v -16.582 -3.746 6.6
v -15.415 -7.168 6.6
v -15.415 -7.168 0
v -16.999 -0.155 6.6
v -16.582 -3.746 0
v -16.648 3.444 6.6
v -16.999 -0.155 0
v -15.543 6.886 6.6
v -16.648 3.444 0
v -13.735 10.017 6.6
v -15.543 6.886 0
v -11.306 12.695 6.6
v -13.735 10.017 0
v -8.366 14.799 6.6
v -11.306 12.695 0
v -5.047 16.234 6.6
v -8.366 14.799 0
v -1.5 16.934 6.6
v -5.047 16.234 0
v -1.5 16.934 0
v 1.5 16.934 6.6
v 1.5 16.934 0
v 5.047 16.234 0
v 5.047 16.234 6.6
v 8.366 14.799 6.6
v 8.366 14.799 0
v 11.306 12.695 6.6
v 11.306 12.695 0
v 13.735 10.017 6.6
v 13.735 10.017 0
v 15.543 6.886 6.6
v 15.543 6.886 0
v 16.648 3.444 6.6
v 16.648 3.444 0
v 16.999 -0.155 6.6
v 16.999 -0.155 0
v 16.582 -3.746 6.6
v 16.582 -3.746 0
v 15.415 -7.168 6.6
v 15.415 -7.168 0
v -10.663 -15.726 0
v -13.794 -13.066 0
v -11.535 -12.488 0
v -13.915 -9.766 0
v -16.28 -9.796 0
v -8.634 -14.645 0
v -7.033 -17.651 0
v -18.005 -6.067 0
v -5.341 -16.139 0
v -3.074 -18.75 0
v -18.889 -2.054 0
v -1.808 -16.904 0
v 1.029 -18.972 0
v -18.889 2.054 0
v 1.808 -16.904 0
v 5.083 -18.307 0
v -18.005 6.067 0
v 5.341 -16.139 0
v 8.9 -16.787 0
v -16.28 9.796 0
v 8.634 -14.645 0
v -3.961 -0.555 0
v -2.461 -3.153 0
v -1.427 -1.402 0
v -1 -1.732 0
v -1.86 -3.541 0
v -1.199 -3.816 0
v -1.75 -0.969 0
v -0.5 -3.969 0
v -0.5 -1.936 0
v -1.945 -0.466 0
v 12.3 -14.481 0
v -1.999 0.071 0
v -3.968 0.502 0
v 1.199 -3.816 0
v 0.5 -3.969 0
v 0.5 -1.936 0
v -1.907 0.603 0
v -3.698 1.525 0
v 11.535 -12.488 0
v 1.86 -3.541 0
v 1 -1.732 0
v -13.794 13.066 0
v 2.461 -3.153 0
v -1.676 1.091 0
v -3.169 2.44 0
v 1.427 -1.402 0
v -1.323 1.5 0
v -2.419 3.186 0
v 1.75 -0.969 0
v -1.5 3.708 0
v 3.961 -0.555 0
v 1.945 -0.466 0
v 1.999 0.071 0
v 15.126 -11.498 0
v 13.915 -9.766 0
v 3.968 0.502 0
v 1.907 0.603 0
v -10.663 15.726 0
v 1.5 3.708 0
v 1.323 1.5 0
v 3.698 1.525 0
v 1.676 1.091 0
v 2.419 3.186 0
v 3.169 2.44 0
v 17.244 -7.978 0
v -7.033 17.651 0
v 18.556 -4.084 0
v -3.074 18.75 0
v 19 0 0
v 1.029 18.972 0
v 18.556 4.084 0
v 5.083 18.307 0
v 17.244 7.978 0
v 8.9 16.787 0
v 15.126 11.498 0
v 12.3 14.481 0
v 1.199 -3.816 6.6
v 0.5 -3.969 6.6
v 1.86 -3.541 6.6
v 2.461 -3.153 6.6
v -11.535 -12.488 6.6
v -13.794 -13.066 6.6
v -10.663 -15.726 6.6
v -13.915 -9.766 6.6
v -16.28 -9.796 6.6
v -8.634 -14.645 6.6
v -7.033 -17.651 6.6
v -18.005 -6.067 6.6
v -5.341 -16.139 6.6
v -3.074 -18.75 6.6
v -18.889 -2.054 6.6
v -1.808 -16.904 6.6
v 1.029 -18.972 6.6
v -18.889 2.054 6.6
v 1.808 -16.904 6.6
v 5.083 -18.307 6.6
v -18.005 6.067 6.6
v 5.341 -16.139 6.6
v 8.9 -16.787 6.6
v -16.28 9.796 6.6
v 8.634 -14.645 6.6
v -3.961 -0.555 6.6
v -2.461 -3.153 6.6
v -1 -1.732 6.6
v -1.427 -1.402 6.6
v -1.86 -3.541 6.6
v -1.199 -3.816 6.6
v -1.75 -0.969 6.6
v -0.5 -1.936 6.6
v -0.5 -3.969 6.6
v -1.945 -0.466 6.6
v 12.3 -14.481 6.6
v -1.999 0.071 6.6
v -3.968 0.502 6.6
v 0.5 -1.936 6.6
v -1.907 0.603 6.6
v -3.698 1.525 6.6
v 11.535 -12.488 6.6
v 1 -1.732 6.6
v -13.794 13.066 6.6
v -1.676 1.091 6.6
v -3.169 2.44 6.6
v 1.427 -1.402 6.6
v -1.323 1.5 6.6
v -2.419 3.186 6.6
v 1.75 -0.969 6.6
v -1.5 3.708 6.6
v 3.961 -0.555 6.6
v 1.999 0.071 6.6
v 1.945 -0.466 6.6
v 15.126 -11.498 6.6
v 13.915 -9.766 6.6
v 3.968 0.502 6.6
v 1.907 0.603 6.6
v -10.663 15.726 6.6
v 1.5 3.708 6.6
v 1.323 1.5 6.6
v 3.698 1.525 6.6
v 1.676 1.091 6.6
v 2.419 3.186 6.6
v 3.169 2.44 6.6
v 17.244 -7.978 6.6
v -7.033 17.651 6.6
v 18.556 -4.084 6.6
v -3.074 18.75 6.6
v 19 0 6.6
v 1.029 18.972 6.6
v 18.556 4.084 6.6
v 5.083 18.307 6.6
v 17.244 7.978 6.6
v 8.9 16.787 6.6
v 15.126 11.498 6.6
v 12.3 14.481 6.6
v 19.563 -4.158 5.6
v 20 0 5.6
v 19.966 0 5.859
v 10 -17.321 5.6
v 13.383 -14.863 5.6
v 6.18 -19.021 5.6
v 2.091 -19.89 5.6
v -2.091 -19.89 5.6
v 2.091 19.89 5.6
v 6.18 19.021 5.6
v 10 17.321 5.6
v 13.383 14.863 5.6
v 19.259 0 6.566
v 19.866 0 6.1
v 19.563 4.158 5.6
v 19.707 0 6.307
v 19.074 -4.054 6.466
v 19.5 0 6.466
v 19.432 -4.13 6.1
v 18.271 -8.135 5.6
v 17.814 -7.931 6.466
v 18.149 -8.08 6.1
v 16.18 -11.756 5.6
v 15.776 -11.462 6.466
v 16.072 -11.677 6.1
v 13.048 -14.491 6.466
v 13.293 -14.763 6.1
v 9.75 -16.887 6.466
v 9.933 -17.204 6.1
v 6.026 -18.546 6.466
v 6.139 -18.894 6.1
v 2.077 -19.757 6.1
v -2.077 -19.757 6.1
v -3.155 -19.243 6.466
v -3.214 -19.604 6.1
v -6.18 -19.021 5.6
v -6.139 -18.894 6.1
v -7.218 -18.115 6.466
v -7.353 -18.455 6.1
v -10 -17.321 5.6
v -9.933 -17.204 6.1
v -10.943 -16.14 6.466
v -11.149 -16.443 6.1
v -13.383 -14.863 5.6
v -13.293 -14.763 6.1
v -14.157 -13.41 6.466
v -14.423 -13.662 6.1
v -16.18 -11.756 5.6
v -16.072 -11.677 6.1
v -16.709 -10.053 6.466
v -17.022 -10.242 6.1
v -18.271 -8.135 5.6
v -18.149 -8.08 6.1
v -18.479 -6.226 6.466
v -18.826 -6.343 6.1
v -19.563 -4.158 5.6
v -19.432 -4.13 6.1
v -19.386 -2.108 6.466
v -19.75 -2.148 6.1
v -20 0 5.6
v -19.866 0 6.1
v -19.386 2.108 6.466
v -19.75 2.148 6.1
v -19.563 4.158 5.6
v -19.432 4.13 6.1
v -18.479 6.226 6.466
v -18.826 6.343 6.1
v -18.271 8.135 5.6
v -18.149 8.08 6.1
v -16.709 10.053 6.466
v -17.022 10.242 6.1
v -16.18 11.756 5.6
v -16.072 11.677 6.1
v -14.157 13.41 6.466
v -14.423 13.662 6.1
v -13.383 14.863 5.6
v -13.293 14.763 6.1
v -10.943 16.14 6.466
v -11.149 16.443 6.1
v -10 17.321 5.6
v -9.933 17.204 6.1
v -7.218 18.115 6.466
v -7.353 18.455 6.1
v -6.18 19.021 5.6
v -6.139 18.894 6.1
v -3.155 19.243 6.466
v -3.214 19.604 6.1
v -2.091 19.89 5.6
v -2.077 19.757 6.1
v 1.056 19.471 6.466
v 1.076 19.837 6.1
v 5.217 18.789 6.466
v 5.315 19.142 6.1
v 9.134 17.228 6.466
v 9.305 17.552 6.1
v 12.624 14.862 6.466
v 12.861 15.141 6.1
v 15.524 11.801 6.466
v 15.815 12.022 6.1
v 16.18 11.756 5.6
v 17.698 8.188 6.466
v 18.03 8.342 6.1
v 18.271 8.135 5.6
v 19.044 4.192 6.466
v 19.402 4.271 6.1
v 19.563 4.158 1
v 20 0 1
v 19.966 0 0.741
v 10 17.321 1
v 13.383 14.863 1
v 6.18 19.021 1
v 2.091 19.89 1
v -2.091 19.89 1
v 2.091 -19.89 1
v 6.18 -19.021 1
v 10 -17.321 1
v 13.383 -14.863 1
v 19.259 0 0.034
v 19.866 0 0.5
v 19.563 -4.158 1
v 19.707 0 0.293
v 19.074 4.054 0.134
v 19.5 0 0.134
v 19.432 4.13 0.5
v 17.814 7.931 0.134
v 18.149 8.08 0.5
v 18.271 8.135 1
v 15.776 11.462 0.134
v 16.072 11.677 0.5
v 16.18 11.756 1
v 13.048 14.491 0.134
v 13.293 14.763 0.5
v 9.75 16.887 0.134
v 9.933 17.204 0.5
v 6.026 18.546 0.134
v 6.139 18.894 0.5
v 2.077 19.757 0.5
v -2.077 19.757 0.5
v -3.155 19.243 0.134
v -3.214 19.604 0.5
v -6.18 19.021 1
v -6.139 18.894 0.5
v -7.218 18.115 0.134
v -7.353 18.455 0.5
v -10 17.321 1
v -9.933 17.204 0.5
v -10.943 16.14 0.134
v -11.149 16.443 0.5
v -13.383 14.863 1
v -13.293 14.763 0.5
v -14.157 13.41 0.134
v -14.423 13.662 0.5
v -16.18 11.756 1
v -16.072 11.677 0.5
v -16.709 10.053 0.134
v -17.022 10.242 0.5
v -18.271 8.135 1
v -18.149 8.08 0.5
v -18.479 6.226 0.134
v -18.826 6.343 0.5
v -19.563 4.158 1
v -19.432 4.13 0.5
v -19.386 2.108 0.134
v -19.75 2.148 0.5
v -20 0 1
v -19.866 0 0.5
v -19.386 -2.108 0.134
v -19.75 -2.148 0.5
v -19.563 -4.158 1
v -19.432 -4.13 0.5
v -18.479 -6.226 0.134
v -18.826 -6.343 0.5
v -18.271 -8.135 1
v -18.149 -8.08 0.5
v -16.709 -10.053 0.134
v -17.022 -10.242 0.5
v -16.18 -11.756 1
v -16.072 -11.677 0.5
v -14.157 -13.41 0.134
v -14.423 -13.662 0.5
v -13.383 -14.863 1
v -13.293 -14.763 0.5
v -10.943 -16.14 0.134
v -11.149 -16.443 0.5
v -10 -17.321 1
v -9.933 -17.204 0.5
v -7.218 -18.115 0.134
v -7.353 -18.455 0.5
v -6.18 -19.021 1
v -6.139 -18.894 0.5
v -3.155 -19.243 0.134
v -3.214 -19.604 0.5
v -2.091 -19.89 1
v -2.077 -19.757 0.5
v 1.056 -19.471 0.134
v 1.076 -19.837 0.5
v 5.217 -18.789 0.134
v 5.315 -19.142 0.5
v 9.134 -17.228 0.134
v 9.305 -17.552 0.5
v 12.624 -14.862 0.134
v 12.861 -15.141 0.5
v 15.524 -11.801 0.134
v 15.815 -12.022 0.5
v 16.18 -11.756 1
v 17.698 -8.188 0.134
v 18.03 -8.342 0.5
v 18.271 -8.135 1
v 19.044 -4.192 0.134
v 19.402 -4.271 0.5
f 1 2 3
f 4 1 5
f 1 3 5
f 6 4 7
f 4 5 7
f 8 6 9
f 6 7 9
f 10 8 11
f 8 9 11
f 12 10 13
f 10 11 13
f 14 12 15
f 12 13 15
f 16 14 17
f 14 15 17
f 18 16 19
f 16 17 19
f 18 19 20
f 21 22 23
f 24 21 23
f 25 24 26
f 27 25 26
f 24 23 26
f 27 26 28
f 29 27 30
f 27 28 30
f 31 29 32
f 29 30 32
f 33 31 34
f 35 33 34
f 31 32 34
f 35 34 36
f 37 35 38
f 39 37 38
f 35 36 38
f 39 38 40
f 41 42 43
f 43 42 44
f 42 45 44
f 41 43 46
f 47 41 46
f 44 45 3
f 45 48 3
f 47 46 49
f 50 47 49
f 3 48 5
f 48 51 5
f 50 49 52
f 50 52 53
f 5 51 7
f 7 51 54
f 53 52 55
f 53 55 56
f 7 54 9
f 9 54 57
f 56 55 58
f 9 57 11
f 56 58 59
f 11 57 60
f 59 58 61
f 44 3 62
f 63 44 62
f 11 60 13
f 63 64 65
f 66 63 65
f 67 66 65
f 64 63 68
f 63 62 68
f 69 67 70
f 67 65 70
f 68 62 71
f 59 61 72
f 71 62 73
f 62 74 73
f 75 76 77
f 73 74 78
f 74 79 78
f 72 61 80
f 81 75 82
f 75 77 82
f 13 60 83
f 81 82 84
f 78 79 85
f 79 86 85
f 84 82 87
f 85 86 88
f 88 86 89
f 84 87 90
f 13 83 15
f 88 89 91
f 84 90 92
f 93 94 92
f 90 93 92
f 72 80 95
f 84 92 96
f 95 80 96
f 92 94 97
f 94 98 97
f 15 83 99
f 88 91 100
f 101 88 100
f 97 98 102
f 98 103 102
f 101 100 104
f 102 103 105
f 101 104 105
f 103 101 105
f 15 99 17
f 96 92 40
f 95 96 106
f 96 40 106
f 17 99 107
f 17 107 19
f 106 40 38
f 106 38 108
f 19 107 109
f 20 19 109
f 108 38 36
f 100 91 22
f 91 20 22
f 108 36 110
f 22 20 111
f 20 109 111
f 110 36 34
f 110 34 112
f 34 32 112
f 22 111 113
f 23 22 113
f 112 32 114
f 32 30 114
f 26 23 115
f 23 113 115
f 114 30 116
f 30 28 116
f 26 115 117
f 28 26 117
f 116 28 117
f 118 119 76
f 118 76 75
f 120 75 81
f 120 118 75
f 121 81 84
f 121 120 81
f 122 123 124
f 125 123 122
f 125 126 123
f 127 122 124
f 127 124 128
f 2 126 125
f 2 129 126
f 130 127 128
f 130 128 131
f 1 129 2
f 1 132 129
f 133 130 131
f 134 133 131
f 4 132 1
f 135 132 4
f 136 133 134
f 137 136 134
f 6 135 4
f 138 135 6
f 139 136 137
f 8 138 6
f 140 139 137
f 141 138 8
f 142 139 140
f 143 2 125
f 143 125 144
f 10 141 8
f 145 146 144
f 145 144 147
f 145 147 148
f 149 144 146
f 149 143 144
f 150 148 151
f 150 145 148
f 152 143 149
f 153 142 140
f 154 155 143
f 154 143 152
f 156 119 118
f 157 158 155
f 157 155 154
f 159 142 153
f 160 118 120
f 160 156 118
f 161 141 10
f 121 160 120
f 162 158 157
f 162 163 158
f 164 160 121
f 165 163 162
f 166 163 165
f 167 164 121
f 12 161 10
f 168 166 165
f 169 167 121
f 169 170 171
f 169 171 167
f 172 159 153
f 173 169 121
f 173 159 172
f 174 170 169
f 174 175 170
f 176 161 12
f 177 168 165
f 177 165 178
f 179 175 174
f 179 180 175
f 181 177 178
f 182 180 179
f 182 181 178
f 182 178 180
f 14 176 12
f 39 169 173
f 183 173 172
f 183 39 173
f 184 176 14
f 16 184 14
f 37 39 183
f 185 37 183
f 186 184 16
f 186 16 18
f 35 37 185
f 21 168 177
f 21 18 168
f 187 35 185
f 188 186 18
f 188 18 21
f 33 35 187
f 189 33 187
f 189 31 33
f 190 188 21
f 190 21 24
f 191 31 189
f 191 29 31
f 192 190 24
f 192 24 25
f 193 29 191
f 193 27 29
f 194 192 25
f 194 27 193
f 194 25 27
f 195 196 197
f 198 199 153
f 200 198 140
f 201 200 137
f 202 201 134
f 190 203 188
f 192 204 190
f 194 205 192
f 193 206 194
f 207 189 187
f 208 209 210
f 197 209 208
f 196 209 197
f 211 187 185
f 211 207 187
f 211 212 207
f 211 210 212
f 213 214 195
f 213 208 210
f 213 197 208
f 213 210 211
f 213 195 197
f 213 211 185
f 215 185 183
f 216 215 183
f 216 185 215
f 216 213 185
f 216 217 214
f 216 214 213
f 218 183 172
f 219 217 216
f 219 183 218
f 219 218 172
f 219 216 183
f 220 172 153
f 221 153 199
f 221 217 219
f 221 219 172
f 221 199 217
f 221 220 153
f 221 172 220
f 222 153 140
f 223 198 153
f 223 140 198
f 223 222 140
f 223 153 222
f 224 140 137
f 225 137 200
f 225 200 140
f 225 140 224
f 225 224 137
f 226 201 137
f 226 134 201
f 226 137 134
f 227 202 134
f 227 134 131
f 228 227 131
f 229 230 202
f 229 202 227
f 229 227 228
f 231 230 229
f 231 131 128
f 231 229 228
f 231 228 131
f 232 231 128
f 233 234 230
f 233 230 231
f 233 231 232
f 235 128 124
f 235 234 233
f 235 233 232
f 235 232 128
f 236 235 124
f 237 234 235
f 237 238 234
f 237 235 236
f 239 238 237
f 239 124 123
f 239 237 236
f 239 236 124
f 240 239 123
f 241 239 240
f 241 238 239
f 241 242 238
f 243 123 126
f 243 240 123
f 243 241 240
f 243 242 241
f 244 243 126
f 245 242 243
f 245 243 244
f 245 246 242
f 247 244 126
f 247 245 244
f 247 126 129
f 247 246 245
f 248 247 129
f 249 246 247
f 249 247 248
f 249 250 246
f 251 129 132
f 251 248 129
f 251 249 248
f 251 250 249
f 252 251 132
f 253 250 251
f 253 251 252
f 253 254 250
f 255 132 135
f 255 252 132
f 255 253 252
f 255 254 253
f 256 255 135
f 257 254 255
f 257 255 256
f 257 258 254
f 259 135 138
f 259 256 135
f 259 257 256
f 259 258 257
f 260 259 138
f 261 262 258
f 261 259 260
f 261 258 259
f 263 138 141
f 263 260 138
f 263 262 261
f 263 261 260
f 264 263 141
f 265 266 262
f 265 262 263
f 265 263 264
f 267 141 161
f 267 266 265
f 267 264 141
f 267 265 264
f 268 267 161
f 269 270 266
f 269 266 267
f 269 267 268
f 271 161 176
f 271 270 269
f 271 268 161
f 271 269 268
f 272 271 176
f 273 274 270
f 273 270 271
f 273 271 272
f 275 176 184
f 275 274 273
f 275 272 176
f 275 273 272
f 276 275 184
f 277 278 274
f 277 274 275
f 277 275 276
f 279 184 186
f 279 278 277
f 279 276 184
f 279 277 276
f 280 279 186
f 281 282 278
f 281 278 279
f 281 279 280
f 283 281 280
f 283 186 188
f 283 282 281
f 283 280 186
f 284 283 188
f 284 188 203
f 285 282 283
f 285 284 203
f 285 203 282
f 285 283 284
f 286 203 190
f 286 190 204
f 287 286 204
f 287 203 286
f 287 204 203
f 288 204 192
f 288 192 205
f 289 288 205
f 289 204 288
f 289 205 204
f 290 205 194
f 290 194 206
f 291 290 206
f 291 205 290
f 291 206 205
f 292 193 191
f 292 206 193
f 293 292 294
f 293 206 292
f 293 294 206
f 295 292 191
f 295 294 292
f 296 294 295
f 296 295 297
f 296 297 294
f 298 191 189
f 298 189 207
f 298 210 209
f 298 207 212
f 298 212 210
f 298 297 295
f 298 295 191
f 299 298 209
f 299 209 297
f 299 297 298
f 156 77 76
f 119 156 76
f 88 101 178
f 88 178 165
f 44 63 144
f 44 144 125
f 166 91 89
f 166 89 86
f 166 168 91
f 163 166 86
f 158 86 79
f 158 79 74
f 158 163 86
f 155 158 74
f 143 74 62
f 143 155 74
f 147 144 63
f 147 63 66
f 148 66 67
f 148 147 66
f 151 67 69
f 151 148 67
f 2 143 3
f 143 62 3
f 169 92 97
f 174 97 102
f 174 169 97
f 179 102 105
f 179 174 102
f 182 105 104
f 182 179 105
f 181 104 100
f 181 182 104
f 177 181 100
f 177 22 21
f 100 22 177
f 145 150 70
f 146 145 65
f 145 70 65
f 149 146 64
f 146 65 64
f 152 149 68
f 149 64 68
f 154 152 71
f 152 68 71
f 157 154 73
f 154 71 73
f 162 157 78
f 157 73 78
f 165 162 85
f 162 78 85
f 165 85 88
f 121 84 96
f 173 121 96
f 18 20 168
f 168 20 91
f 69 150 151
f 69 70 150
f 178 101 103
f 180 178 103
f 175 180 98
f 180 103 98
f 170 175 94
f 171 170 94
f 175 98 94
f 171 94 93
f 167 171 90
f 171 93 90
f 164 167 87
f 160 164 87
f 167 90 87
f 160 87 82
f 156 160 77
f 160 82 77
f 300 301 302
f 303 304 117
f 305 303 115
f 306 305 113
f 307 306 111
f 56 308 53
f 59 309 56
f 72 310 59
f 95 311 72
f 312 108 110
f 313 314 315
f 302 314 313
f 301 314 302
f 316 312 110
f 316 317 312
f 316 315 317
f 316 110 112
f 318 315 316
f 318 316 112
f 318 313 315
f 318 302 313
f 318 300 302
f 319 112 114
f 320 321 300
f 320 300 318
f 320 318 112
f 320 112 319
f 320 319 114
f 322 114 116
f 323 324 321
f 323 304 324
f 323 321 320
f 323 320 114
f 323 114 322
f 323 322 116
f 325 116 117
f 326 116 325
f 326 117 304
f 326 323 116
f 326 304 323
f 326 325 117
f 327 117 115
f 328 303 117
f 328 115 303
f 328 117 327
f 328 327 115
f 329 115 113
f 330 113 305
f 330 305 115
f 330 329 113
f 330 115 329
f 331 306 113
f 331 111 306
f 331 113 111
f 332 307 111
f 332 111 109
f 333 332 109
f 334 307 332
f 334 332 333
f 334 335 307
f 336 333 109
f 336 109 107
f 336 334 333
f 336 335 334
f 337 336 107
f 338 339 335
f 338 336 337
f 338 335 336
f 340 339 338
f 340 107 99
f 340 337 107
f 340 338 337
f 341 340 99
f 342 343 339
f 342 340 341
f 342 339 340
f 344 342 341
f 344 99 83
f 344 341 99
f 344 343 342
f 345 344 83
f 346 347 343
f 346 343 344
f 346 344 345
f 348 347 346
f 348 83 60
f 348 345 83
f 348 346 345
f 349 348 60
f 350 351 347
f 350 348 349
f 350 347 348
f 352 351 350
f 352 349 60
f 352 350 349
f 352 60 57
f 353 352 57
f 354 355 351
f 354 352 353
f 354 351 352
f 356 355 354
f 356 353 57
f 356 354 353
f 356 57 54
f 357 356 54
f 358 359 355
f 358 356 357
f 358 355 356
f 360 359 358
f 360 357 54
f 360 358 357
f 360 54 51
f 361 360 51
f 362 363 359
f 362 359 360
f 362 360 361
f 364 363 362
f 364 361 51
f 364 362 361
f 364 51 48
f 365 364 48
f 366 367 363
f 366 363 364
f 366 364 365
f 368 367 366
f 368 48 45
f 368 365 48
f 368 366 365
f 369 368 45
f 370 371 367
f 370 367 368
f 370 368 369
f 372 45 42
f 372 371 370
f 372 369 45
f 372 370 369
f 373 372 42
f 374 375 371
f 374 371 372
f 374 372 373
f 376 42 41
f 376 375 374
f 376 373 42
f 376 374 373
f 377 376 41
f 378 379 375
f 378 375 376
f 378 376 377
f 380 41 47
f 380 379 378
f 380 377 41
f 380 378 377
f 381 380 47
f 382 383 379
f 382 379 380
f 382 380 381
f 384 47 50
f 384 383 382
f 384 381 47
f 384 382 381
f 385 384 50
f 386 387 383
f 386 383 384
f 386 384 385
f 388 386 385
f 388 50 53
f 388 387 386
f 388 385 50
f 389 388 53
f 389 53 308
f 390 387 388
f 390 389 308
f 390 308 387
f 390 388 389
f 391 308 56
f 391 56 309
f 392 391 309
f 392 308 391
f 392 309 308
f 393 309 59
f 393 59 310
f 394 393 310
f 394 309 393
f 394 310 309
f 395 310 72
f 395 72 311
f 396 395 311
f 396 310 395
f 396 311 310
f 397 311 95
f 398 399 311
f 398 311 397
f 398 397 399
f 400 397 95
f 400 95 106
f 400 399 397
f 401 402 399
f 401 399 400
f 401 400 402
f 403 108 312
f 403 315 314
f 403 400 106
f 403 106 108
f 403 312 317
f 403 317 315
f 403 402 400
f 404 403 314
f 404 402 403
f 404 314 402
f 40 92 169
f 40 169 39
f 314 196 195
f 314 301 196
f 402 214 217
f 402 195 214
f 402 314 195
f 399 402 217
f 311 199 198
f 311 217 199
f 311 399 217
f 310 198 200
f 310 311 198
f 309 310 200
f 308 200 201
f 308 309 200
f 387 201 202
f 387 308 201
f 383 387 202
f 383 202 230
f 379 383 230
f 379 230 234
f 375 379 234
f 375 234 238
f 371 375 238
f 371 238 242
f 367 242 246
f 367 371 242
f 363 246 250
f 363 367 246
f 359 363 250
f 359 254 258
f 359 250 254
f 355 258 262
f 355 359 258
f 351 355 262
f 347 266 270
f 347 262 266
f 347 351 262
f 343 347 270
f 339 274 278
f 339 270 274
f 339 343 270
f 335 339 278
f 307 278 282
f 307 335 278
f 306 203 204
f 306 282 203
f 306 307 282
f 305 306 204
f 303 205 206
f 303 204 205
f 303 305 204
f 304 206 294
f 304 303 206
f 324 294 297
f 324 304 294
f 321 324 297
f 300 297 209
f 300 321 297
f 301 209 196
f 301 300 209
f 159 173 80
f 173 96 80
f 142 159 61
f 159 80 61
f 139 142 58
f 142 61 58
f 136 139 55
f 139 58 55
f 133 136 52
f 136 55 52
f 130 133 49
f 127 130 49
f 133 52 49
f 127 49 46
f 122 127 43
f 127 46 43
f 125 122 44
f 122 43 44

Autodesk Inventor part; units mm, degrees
ref_plane "YZ Plane" through (0, 0, 0) normal (1, 0, 0) x (0, 1, 0)
ref_plane "XZ Plane" through (0, 0, 0) normal (0, 1, 0) x (-1, 0, 0)
ref_plane "XY Plane" through (0, 0, 0) normal (0, 0, 1) x (1, 0, 0)
sketch "Sketch1" plane through (0, 0, 0) normal (0, 0, 1) x (1, 0, 0)
  circle A0 centre (0, 0) radius 20
  dimension "d0" = 40
extrude "Extrusion1" add sketch "Sketch1" along normal blind 6.6
sketch "Sketch3" plane through (0, 0, 0) normal (0, 0, -1) x (-1, 0, 0)
  circle A0 centre (0, 0) radius 17
  line L0 (0, 17) -> (0, 0)
  line L1 (0, 0) -> (14.7224, -8.5)
  line L2 (0, 0) -> (-14.7224, -8.5)
  line L3 (0, 0) -> (17, 0) construction
  line L4 (1.5, 16.9337) -> (1.5, 0.866)
  line L5 (-1.5, 16.9337) -> (-1.5, 0.866)
  line L6 (-1.5, 0.866) -> (-15.415, -7.1678)
  line L7 (0, -1.7321) -> (-13.915, -9.7659)
  line L8 (1.5, 0.866) -> (15.415, -7.1678)
  line L9 (0, -1.7321) -> (13.915, -9.7659)
  dimension "d6" = 34
  dimension "d7" = 120
  dimension "d8" = 150
  dimension "d9" = 1.5
  dimension "d10" = 1.5
  dimension "d11" = 1.5
  dimension "d12" = 1.5
  dimension "d13" = 1.5
  dimension "d14" = 1.5
extrude "Extrusion3" cut sketch "Sketch3" against normal up to surface (6.6 mm away) contours A0 L8 L4 | L5 L6 A0 | A0 L7 L9
sketch "Sketch5" plane through (0, 0, 6.6) normal (0, 0, 1) x (1, 0, 0)
  circle A0 centre (0, 0) radius 4
  dimension "d20" = 8
extrude "Extrusion5" add sketch "Sketch5" against normal blind 6.6
sketch "Sketch6" plane through (0, 0, 0) normal (0, 0, -1) x (-1, 0, 0)
  circle A0 centre (0, 0) radius 2
  line L0 (0, -2) -> (0, -4)
  arc A1 (-2.4613, -3.1531) -> (2.4613, -3.1531) centre (0, 0) ccw projected
  line L1 (0.5, -1.9365) -> (0.5, -3.9686)
  line L2 (-0.5, -1.9365) -> (-0.5, -3.9686)
  line L3 (-1.3229, 1.5) -> (1.3229, 1.5)
  point P0 (0.0845, 1.5)
  dimension "d23" = 4
  dimension "d24" = 0.5
  dimension "d25" = 0.5
  dimension "d29" = 3.5
extrude "Extrusion6" cut sketch "Sketch6" against normal up to surface (6.6 mm away) contours A0 L3 | L1 A1 L0 A0 | L0 A1 L2 A0 picked at (-0.5622, -0.3103)
fillet "Arredondamento1" radius 1 2 edges at (-20, 0, 6.6) (-20, 0, 0)
properties part number "wheel4mmV1"
